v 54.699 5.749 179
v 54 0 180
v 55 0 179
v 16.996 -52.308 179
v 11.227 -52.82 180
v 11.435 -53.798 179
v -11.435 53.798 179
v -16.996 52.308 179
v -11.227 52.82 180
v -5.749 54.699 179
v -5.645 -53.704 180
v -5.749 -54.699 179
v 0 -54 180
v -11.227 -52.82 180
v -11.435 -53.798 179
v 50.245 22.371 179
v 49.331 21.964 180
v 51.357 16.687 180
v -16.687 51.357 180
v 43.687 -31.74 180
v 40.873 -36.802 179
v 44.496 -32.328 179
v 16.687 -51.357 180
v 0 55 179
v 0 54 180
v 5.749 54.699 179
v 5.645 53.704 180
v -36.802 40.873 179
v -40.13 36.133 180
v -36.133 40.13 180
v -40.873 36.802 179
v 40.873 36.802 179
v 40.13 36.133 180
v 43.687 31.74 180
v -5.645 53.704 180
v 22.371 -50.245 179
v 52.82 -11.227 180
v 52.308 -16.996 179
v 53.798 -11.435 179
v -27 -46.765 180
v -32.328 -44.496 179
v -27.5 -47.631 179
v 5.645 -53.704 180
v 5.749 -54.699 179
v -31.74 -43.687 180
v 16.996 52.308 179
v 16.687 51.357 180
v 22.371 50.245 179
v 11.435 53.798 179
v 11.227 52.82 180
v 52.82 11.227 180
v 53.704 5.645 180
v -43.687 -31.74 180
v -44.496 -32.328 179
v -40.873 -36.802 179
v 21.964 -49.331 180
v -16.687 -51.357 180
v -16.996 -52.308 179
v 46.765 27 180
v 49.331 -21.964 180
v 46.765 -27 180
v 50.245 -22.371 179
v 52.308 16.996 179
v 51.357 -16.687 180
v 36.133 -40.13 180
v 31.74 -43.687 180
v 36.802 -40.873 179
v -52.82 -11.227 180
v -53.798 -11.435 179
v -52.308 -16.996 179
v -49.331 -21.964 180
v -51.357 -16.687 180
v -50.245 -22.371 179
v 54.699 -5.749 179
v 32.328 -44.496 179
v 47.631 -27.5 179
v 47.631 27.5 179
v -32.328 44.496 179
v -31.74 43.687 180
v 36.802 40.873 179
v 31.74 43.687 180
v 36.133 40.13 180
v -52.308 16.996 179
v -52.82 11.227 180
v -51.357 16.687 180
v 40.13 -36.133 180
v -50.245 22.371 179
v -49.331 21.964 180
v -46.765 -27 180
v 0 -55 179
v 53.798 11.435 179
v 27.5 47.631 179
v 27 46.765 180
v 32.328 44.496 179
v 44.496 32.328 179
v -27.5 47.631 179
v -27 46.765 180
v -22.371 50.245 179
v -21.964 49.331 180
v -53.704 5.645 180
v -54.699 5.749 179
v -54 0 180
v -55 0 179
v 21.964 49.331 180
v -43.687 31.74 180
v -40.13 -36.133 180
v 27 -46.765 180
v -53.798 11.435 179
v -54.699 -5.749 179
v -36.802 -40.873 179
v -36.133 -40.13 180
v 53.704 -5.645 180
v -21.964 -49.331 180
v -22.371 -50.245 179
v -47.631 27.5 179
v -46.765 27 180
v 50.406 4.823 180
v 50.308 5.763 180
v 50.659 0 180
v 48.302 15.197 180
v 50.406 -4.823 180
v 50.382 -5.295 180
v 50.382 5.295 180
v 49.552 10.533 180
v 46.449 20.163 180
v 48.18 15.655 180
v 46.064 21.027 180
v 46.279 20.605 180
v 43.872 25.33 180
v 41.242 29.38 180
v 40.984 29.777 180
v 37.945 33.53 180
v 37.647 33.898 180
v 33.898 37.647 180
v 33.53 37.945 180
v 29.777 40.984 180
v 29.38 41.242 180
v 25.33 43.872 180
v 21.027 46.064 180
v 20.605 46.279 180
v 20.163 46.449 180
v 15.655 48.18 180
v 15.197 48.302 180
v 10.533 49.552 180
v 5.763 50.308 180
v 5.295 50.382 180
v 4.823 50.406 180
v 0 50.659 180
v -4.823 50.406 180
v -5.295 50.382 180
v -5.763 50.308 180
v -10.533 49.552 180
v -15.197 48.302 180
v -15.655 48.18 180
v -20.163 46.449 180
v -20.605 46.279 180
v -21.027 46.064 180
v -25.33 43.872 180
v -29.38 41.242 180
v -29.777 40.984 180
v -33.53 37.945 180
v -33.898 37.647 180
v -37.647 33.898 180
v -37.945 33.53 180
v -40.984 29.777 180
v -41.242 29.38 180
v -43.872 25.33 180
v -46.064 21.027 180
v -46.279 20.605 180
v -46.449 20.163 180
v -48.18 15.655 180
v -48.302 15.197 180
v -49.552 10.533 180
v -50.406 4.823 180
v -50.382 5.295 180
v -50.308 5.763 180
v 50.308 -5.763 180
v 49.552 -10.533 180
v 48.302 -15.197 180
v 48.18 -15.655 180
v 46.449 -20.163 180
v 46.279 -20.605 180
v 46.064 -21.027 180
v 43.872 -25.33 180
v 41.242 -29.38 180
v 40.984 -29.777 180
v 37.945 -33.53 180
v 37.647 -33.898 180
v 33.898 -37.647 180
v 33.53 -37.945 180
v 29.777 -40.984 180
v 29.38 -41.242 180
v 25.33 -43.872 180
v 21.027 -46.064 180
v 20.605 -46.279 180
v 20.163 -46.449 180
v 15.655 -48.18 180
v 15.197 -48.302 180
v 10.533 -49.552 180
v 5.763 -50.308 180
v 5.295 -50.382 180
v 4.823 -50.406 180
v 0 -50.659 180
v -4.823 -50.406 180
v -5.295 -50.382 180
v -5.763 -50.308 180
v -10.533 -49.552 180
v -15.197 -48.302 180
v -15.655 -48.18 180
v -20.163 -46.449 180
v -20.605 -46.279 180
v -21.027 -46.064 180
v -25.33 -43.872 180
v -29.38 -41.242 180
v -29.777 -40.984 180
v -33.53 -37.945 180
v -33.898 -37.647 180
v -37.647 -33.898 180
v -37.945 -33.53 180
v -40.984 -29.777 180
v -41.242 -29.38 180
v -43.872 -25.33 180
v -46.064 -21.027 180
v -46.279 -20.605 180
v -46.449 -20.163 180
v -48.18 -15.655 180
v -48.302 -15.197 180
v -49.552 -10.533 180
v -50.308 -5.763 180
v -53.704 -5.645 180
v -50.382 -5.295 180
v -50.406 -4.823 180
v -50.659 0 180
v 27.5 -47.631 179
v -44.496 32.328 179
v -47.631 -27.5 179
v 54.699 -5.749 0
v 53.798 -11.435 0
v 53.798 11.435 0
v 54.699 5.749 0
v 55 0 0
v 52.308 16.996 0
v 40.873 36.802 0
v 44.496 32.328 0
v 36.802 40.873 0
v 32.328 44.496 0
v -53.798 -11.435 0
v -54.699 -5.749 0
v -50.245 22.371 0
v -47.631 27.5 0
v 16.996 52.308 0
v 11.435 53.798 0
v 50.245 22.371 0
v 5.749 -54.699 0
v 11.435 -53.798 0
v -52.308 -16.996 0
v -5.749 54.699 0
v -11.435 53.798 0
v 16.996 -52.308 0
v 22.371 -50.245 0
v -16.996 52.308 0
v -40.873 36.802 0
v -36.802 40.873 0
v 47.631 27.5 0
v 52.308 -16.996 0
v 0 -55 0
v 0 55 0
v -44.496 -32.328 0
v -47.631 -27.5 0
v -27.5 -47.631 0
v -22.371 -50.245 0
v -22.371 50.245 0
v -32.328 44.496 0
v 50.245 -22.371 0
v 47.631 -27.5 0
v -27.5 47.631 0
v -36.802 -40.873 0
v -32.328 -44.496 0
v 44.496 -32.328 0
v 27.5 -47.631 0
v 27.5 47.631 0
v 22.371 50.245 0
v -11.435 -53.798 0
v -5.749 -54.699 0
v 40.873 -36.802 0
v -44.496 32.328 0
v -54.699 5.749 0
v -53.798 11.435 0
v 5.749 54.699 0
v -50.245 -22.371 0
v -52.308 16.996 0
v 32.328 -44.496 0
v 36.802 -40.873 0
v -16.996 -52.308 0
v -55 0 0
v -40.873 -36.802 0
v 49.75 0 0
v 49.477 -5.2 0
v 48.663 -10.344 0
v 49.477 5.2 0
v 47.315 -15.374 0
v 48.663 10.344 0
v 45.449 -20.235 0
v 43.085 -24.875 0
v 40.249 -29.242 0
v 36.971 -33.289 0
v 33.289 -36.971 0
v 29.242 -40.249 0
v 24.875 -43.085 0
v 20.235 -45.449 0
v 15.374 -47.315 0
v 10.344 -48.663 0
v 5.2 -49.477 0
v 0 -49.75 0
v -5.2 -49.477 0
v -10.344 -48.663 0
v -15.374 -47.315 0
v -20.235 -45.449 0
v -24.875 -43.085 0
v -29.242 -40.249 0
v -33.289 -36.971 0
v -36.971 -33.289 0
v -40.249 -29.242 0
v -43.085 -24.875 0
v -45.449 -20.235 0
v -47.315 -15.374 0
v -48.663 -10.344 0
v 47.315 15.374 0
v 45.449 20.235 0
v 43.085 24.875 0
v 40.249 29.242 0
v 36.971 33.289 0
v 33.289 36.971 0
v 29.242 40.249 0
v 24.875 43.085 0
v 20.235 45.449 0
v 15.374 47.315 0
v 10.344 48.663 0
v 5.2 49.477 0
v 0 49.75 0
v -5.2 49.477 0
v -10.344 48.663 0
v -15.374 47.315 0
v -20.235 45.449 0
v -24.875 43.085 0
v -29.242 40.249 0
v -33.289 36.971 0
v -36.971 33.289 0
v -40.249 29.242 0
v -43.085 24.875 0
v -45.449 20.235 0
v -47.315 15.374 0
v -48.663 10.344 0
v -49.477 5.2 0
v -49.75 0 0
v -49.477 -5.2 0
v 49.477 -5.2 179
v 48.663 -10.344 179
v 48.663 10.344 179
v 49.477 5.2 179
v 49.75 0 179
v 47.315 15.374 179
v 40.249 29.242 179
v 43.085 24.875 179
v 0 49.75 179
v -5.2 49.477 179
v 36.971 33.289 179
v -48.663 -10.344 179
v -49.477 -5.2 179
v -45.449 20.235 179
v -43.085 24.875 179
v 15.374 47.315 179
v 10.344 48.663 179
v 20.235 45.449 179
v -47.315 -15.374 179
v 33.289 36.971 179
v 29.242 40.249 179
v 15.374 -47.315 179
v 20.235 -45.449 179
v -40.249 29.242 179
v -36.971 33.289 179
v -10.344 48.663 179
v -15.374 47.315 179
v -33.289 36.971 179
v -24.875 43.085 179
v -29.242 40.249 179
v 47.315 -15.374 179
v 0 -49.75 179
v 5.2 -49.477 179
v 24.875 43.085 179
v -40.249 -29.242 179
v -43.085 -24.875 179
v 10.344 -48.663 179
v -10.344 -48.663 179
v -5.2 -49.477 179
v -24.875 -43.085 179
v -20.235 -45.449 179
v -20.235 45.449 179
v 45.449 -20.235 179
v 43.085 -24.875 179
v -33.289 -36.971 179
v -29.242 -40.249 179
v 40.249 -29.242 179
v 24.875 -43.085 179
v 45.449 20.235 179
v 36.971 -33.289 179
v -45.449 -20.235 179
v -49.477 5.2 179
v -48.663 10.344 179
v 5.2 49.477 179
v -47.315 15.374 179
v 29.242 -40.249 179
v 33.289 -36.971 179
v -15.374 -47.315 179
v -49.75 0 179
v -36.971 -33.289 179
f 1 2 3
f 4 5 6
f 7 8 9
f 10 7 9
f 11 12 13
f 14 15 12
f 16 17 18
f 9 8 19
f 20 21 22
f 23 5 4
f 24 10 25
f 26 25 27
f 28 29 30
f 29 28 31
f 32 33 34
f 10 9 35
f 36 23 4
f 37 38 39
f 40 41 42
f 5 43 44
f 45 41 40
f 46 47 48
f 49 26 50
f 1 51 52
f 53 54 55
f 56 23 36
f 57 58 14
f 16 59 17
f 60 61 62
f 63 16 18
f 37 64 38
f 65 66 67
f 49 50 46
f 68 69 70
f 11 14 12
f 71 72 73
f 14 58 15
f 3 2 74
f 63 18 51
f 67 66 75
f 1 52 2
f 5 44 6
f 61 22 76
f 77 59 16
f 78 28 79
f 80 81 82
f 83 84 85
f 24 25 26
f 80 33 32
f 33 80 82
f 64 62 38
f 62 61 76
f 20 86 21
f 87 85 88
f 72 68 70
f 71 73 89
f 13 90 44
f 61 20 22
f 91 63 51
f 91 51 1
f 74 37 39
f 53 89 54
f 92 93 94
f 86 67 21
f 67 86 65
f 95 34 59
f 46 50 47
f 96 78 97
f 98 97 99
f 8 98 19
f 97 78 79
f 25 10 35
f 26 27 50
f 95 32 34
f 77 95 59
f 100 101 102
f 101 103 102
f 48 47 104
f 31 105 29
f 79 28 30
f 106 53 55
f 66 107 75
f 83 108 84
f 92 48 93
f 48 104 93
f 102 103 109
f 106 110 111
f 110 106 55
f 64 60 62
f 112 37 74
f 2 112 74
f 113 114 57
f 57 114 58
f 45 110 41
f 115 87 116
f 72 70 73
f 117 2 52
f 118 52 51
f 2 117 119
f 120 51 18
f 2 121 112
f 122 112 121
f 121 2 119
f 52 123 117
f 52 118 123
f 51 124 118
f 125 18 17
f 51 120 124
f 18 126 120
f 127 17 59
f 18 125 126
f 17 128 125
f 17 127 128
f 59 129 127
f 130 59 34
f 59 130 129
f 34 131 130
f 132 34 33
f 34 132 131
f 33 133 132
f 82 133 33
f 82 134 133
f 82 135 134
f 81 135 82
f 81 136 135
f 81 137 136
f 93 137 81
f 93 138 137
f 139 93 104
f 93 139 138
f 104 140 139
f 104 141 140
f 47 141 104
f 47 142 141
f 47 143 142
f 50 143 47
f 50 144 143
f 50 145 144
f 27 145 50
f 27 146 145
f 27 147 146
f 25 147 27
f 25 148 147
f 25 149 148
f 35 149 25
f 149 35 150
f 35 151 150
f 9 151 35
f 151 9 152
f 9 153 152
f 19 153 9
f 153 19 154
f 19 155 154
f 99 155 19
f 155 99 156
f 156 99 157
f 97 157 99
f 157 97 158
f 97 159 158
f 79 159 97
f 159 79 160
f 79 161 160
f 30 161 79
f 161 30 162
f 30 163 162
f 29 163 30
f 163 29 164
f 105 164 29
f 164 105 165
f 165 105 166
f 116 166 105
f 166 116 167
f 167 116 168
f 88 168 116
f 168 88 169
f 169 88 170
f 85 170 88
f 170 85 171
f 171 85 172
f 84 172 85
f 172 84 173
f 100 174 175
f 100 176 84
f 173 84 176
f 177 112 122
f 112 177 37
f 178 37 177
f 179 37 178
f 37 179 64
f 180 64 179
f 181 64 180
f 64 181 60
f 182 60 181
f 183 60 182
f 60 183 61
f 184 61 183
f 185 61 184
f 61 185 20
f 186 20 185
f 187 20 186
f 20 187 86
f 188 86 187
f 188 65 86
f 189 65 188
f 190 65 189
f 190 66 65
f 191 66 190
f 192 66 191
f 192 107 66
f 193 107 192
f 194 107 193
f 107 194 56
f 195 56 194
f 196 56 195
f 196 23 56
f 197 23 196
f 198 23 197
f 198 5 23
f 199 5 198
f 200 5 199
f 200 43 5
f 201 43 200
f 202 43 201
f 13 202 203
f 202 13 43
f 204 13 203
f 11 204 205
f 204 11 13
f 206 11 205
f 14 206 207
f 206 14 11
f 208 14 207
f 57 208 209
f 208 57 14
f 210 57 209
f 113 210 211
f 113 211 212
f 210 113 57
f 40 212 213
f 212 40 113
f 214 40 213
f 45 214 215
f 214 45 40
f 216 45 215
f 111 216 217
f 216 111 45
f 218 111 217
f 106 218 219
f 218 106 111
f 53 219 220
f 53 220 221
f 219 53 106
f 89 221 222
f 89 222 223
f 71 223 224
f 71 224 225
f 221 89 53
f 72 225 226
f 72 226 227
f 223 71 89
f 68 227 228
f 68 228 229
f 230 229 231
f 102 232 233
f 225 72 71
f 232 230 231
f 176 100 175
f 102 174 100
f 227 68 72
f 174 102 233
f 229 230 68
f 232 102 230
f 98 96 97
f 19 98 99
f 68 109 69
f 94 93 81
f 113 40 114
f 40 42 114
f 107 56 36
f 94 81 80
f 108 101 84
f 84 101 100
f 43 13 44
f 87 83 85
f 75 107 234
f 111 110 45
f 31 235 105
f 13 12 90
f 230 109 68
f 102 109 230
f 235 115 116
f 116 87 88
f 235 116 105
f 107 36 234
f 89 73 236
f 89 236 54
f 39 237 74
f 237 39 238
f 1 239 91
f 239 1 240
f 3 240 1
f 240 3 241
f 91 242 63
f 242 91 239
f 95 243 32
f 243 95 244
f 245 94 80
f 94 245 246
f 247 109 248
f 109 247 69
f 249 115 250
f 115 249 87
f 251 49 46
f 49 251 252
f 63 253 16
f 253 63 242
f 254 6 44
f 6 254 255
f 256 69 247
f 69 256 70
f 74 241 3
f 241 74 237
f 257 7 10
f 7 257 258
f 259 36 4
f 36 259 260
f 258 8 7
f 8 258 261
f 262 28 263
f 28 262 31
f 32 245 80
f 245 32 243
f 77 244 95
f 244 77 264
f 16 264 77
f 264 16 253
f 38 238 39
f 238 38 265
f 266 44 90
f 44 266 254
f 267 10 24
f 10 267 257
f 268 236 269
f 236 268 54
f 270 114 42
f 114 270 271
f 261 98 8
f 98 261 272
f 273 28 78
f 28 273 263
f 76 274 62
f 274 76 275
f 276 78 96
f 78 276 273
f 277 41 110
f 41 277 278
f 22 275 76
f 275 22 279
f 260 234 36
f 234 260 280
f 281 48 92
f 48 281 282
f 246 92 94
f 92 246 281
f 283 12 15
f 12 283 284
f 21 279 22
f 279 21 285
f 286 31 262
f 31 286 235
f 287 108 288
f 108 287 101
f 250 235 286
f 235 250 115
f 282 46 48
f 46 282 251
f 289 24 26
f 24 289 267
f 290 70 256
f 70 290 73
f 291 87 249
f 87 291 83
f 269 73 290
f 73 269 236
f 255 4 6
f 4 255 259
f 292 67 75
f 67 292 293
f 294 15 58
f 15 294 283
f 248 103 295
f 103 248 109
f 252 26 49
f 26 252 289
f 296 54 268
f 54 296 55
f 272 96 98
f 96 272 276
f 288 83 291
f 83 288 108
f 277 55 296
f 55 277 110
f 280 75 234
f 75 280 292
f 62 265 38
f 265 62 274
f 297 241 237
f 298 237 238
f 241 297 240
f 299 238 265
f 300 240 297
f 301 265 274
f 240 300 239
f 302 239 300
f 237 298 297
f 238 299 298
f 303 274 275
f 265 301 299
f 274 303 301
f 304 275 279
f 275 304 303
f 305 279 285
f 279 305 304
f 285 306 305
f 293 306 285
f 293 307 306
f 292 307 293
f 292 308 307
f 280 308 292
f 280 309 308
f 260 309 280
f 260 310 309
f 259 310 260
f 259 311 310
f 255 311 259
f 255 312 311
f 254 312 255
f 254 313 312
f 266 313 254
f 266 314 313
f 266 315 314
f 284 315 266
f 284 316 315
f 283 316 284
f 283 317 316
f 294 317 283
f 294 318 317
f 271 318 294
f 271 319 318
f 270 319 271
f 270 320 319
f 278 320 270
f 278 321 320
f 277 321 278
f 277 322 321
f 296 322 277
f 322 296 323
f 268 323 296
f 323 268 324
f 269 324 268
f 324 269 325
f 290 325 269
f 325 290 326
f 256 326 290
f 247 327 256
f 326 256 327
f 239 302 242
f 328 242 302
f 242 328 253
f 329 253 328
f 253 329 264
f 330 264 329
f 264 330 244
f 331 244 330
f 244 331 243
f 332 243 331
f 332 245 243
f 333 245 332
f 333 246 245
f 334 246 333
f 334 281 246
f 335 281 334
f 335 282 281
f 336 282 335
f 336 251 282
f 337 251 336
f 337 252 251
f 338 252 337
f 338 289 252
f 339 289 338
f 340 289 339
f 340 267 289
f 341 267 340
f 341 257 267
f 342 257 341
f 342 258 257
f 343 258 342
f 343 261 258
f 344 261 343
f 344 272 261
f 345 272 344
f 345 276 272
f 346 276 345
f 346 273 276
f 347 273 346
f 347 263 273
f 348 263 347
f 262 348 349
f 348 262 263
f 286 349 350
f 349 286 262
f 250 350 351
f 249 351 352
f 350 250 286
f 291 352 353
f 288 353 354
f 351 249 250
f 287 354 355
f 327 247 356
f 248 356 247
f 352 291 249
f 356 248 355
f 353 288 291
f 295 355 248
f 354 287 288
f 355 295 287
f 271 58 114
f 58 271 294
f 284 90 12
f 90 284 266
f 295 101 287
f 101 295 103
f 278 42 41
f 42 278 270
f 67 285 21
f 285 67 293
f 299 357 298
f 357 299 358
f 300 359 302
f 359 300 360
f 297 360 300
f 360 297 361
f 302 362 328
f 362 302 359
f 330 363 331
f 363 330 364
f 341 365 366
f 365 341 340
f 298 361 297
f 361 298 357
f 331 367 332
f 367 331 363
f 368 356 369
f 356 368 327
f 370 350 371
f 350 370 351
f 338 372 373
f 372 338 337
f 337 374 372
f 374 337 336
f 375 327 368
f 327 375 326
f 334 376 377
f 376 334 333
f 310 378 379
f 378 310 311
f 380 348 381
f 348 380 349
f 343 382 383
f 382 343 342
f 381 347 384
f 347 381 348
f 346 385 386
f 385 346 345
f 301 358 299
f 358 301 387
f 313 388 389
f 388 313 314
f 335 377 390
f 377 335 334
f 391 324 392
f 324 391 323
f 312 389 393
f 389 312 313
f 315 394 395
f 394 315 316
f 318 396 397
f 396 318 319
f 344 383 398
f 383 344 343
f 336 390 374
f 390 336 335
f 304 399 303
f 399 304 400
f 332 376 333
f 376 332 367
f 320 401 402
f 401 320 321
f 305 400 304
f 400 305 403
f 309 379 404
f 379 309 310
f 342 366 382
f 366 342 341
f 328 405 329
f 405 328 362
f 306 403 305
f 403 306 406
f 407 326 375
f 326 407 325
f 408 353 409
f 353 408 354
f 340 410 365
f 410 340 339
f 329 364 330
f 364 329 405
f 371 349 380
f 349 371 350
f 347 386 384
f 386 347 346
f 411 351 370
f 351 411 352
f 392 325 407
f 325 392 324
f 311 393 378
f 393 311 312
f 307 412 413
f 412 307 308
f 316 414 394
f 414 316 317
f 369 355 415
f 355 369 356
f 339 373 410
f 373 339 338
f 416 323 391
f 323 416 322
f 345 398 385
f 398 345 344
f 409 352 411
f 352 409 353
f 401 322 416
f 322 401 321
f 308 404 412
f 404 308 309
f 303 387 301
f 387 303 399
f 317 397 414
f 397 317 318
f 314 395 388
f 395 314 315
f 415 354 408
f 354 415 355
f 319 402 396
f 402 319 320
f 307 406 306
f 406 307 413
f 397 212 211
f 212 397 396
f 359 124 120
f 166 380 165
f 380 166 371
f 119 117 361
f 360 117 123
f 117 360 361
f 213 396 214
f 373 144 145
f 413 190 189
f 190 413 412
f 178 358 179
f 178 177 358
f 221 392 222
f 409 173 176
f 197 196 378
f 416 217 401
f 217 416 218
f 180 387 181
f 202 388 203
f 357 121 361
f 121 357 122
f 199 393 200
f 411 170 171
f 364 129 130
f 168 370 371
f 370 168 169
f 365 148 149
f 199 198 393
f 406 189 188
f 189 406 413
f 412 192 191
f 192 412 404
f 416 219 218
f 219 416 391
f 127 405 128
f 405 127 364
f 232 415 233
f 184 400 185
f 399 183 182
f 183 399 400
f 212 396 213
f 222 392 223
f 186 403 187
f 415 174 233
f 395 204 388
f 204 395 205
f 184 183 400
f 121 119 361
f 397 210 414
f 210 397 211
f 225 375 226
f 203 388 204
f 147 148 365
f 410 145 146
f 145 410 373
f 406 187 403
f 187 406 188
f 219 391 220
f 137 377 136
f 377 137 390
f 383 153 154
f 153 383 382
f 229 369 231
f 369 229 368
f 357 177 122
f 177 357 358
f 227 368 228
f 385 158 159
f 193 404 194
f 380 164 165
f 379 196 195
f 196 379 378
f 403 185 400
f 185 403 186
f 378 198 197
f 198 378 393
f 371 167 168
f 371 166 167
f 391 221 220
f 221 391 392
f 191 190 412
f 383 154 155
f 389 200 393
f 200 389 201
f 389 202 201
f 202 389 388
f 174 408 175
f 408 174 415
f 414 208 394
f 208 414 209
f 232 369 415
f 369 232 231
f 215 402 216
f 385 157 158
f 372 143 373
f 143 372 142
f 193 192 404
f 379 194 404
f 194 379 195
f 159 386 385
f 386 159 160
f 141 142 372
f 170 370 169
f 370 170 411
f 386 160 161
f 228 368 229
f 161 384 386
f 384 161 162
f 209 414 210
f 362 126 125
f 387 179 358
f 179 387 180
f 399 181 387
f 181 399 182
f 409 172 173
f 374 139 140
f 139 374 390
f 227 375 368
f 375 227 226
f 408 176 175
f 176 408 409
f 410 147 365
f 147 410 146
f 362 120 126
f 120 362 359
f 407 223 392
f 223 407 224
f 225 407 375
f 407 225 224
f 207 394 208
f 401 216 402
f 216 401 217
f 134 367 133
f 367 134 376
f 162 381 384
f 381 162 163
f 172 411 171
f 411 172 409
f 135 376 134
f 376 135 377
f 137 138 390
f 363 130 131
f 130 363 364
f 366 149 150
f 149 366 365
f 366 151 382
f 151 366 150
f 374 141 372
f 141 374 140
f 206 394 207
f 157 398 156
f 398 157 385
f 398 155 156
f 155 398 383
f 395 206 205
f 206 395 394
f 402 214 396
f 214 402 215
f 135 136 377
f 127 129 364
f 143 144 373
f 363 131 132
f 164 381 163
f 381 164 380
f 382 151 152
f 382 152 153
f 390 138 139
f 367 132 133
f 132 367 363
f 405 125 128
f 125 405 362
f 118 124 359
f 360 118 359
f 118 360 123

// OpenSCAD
// file: _params.scad
// =========================================================================
// 공유 파라미터 (모든 개별 부품 파일에서 include)
// 메인 어셈블리: cup_z_x_catrage_frame_water_mic_anti_3030.scad 에서 추출
// 프레임: 600 × 420 × 700mm (3030 프로파일, Y=0 대칭)
// =========================================================================

$fn = 60;  // 부품 출력용 고해상도
GLOBAL_TOLERANCE = 0.2;

// --- [1] 하부 기성품 및 원통 파라미터 ---
X_RAIL_LEN = 290.0;
X_BLOCK_W = 30.0; X_BLOCK_L = 32.0;   // 신규 X슬라이더 블록 (폭 30mm × 길이 32mm)
X_PITCH_X = 20.0; X_PITCH_Y = 20.0;   // 체결 홀 피치 (20 × 20mm, M3 나사탭 4개)
X_RAIL_W = 30.0;  X_RAIL_H = 20.0;   // 레일 폭 30mm (레일 바닥~블록 윗면 높이 29mm 반영)
X_TOTAL_H = 29.0;                    // 레일 바닥에서 슬라이더 블록 윗면까지의 높이

MOTOR_W = 42.0;      MOTOR_PITCH = 31.0; MOTOR_HOLE_D = 3.5;    
MOTOR_BOSS_D = 22.0; MOTOR_BOSS_H = 2.0; SCREW_D = 8.0;         
MOT_BODY_L = 41.0;   SHAFT_L = 24.0;     // 실측 NEMA17 몸통 41mm / 축 돌출 24mm

CUP_ID = 99.5;  CUP_WALL = 5.0; CUP_OD = 110.0;     // 아크릴 원통 OD110/ID100
CUP_H = 180.0;   CAGE_H = 60.0;  FLOOR_H = 10.0; PISTON_H = 20.0;     

LIP_D = 30.0;    LIP_H = 5.0;    LEAK_DRAIN_D = 4.0;    
GUIDE_PIPE_D = 8.0; BUSHING_OD = 12.0; BUSHING_H = 8.0;       
DRAIN_RADIUS = 35.0; DRAIN_D = 8.0;        

Y_OFFSET = 85.0; BRKT_H = 12.0; BRKT_D = 122.0; BRKT_ID = 62.0; Z_MOUNT_PCD = 86.0;   

// --- [2] 아크릴 파이프 및 상부 카트리지 ---
ACRYL_ID = 100.0; ACRYL_T = 5.0; ACRYL_OD = ACRYL_ID + (ACRYL_T * 2);  // OD110 (아크릴집 106 재고없음 → 컵과 동일 규격)

REVOLVER_PCD = 240.0;     // 인접 카트리지 웹 9.8mm 확보 (OD110 대응, 230→240)
CARTRIDGE_OD = REVOLVER_PCD + ACRYL_OD + 8; 
TOP_PLATE_H = 15.0;       // 아크릴 15T 통판 (보스홀 단 깊이 10mm)

HUB_D = 60.0;            
SHAFT_D = 12.0;          
HUB_WALL = 4.0;          
HUB_H = 15.0;             // 아크릴 5T × 3장 적층 — 파이프 130mm 대응
POCKET_DEPTH = 5.0;
MID_HUB_Z = 63.5;          // 중단 허브 하면 Z (벨트 중심 Z=71.0mm 정렬, 풀리 상단 Z=75.0mm = 축상단-1mm)
UPPER_HUB_Z = 135.0;       // 상단 허브 하면 Z (전체 135+15=150 유지)
BOSS_OD = 35.0;
BOSS_H = 11.0;             // 보스11 + 와셔1 = 12, 리세스10 → 허브 2mm 공중

// --- [3] GT2 벨트 구동 시스템 ---
GT2_PITCH     = 2.0;
GT2_BELT_W    = 6.0;
BIG_PULLEY_TEETH = 566;
BIG_PULLEY_PD = BIG_PULLEY_TEETH * GT2_PITCH / PI;
BIG_PULLEY_OD = BIG_PULLEY_PD + 1.0;
SMALL_PULLEY_TEETH = 20;
SMALL_PULLEY_PD = SMALL_PULLEY_TEETH * GT2_PITCH / PI;
SMALL_PULLEY_OD = SMALL_PULLEY_PD + 1.0;

BELT_MOTOR_X = -300;
BELT_MOTOR_Y = -155.5;
BRKT_MOTOR_H = 25.0;
BRKT_MOTOR_W = 45.0;        // 브래킷 폭 45mm (프로파일 간섭 회피 복원)
SLOT_LEN = 10.0;
FLAG_W = 15.0;  FLAG_H = 8.0;  FLAG_T = 1.5;

X_POS_MEASURE = 170.0;   // 측정 브래킷 X좌표 (X_M~X_R 정중앙, X대칭)

// --- [4] 3030 프레임 경계 (600×430×700mm) ---
PF = 30;             // 3030 알루미늄 프로파일
WASHER_T = 1.0;     

X_L = -320;
X_M = 60;
X_R = 250;
Y_F = -210;          // 전방 (대칭: -210+30=-180, Y=0 중심)
Y_B = 180;           // 후방 (대칭: 180+30=210, Y=0 중심) — 메인파일과 동기화

Z_BOT = -480;
Z_RAIL = -322;
Z_MID = -TOP_PLATE_H - PF;
Z_TOP = 220;

SUPPORT_PILLAR_H = Z_TOP - PF;

SHAFT_SQ = 20;       // 2020 사각 회전축

// 사각 축 홀 크기
SQ = SHAFT_SQ + GLOBAL_TOLERANCE;  // 20.2mm

// --- 리볼버/컵 축 정렬 (보스홀=판 중심에 리볼버 정렬) ---
REVOLVER_CX = (X_L + X_M + PF)/2;        // 판 중심 = 보스홀 = 리볼버 회전축 (-115)
DROP_X      = REVOLVER_CX + REVOLVER_PCD/2;  // 링 드롭 / 컵 적재 축 (+5)

FLANGE_Z = 52.0;       // 모터 전면 안착 높이 (Z=52mm -> 축 상단 Z=76mm, 풀리 결합)

// --- [5] 모터 체결홀 (이미 제작 완료된 15T 상판 원본 도면 수치 100% 유지) ---
MOTOR_BOLT_PITCH     = 25.0;      // Y피치 (Y = ±12.5mm)
MOTOR_BOLT_X_NOMINAL = X_L + 55;  // 1열: 상판 좌단 55 (모터축 기준 +35mm = X=-265mm)
MOTOR_BOLT_X_SHIFT   = X_L + 40;  // 2열: 상판 좌단 40 (모터축 기준 +20mm = X=-280mm)

// 모터 마운트 볼트 카운터보어 (단볼트용 — 브래킷 두께 25 중 깊게 파냄)
MOTOR_CB_D     = 6.5;            // M3 캡볼트 머리 클리어런스
MOTOR_CB_DEPTH = 19;             // 카운터보어 깊이 (잔여 통과 6mm → M3×10 단볼트)
// main file
// =========================================================================
// [구매] 컵 원통 (수조 아크릴 파이프) × 1
// 구매: 아크릴 파이프 OD110 ID100 (벽5) 높이 180mm
// 모따기: 상면 내경 C1 + 상면 외경 C1 (선반가공). 하면 모따기 없음
// =========================================================================
include <_params.scad>

CHAM = 1.0;  // 모따기 C1 (상면만, 내·외경)

color([0.2, 0.5, 0.8, 0.25]) difference() {
    cylinder(d=CUP_OD, h=CUP_H);
    // 보어 관통
    translate([0, 0, -1]) cylinder(d=CUP_ID, h=CUP_H + 2);
    // 상면 내경 모따기 C1 (보어 윗모서리 면취)
    translate([0, 0, CUP_H - CHAM])
        cylinder(d1=CUP_ID, d2=CUP_ID + CHAM*2, h=CHAM + 0.1);
    // 상면 외경 모따기 C1 (외측 윗모서리 면취 — 콘 외측 링 컷)
    translate([0, 0, CUP_H - CHAM])
        difference() {
            cylinder(d=CUP_OD + 4, h=CHAM + 1);
            cylinder(d1=CUP_OD, d2=CUP_OD - CHAM*2, h=CHAM);
        }
}
